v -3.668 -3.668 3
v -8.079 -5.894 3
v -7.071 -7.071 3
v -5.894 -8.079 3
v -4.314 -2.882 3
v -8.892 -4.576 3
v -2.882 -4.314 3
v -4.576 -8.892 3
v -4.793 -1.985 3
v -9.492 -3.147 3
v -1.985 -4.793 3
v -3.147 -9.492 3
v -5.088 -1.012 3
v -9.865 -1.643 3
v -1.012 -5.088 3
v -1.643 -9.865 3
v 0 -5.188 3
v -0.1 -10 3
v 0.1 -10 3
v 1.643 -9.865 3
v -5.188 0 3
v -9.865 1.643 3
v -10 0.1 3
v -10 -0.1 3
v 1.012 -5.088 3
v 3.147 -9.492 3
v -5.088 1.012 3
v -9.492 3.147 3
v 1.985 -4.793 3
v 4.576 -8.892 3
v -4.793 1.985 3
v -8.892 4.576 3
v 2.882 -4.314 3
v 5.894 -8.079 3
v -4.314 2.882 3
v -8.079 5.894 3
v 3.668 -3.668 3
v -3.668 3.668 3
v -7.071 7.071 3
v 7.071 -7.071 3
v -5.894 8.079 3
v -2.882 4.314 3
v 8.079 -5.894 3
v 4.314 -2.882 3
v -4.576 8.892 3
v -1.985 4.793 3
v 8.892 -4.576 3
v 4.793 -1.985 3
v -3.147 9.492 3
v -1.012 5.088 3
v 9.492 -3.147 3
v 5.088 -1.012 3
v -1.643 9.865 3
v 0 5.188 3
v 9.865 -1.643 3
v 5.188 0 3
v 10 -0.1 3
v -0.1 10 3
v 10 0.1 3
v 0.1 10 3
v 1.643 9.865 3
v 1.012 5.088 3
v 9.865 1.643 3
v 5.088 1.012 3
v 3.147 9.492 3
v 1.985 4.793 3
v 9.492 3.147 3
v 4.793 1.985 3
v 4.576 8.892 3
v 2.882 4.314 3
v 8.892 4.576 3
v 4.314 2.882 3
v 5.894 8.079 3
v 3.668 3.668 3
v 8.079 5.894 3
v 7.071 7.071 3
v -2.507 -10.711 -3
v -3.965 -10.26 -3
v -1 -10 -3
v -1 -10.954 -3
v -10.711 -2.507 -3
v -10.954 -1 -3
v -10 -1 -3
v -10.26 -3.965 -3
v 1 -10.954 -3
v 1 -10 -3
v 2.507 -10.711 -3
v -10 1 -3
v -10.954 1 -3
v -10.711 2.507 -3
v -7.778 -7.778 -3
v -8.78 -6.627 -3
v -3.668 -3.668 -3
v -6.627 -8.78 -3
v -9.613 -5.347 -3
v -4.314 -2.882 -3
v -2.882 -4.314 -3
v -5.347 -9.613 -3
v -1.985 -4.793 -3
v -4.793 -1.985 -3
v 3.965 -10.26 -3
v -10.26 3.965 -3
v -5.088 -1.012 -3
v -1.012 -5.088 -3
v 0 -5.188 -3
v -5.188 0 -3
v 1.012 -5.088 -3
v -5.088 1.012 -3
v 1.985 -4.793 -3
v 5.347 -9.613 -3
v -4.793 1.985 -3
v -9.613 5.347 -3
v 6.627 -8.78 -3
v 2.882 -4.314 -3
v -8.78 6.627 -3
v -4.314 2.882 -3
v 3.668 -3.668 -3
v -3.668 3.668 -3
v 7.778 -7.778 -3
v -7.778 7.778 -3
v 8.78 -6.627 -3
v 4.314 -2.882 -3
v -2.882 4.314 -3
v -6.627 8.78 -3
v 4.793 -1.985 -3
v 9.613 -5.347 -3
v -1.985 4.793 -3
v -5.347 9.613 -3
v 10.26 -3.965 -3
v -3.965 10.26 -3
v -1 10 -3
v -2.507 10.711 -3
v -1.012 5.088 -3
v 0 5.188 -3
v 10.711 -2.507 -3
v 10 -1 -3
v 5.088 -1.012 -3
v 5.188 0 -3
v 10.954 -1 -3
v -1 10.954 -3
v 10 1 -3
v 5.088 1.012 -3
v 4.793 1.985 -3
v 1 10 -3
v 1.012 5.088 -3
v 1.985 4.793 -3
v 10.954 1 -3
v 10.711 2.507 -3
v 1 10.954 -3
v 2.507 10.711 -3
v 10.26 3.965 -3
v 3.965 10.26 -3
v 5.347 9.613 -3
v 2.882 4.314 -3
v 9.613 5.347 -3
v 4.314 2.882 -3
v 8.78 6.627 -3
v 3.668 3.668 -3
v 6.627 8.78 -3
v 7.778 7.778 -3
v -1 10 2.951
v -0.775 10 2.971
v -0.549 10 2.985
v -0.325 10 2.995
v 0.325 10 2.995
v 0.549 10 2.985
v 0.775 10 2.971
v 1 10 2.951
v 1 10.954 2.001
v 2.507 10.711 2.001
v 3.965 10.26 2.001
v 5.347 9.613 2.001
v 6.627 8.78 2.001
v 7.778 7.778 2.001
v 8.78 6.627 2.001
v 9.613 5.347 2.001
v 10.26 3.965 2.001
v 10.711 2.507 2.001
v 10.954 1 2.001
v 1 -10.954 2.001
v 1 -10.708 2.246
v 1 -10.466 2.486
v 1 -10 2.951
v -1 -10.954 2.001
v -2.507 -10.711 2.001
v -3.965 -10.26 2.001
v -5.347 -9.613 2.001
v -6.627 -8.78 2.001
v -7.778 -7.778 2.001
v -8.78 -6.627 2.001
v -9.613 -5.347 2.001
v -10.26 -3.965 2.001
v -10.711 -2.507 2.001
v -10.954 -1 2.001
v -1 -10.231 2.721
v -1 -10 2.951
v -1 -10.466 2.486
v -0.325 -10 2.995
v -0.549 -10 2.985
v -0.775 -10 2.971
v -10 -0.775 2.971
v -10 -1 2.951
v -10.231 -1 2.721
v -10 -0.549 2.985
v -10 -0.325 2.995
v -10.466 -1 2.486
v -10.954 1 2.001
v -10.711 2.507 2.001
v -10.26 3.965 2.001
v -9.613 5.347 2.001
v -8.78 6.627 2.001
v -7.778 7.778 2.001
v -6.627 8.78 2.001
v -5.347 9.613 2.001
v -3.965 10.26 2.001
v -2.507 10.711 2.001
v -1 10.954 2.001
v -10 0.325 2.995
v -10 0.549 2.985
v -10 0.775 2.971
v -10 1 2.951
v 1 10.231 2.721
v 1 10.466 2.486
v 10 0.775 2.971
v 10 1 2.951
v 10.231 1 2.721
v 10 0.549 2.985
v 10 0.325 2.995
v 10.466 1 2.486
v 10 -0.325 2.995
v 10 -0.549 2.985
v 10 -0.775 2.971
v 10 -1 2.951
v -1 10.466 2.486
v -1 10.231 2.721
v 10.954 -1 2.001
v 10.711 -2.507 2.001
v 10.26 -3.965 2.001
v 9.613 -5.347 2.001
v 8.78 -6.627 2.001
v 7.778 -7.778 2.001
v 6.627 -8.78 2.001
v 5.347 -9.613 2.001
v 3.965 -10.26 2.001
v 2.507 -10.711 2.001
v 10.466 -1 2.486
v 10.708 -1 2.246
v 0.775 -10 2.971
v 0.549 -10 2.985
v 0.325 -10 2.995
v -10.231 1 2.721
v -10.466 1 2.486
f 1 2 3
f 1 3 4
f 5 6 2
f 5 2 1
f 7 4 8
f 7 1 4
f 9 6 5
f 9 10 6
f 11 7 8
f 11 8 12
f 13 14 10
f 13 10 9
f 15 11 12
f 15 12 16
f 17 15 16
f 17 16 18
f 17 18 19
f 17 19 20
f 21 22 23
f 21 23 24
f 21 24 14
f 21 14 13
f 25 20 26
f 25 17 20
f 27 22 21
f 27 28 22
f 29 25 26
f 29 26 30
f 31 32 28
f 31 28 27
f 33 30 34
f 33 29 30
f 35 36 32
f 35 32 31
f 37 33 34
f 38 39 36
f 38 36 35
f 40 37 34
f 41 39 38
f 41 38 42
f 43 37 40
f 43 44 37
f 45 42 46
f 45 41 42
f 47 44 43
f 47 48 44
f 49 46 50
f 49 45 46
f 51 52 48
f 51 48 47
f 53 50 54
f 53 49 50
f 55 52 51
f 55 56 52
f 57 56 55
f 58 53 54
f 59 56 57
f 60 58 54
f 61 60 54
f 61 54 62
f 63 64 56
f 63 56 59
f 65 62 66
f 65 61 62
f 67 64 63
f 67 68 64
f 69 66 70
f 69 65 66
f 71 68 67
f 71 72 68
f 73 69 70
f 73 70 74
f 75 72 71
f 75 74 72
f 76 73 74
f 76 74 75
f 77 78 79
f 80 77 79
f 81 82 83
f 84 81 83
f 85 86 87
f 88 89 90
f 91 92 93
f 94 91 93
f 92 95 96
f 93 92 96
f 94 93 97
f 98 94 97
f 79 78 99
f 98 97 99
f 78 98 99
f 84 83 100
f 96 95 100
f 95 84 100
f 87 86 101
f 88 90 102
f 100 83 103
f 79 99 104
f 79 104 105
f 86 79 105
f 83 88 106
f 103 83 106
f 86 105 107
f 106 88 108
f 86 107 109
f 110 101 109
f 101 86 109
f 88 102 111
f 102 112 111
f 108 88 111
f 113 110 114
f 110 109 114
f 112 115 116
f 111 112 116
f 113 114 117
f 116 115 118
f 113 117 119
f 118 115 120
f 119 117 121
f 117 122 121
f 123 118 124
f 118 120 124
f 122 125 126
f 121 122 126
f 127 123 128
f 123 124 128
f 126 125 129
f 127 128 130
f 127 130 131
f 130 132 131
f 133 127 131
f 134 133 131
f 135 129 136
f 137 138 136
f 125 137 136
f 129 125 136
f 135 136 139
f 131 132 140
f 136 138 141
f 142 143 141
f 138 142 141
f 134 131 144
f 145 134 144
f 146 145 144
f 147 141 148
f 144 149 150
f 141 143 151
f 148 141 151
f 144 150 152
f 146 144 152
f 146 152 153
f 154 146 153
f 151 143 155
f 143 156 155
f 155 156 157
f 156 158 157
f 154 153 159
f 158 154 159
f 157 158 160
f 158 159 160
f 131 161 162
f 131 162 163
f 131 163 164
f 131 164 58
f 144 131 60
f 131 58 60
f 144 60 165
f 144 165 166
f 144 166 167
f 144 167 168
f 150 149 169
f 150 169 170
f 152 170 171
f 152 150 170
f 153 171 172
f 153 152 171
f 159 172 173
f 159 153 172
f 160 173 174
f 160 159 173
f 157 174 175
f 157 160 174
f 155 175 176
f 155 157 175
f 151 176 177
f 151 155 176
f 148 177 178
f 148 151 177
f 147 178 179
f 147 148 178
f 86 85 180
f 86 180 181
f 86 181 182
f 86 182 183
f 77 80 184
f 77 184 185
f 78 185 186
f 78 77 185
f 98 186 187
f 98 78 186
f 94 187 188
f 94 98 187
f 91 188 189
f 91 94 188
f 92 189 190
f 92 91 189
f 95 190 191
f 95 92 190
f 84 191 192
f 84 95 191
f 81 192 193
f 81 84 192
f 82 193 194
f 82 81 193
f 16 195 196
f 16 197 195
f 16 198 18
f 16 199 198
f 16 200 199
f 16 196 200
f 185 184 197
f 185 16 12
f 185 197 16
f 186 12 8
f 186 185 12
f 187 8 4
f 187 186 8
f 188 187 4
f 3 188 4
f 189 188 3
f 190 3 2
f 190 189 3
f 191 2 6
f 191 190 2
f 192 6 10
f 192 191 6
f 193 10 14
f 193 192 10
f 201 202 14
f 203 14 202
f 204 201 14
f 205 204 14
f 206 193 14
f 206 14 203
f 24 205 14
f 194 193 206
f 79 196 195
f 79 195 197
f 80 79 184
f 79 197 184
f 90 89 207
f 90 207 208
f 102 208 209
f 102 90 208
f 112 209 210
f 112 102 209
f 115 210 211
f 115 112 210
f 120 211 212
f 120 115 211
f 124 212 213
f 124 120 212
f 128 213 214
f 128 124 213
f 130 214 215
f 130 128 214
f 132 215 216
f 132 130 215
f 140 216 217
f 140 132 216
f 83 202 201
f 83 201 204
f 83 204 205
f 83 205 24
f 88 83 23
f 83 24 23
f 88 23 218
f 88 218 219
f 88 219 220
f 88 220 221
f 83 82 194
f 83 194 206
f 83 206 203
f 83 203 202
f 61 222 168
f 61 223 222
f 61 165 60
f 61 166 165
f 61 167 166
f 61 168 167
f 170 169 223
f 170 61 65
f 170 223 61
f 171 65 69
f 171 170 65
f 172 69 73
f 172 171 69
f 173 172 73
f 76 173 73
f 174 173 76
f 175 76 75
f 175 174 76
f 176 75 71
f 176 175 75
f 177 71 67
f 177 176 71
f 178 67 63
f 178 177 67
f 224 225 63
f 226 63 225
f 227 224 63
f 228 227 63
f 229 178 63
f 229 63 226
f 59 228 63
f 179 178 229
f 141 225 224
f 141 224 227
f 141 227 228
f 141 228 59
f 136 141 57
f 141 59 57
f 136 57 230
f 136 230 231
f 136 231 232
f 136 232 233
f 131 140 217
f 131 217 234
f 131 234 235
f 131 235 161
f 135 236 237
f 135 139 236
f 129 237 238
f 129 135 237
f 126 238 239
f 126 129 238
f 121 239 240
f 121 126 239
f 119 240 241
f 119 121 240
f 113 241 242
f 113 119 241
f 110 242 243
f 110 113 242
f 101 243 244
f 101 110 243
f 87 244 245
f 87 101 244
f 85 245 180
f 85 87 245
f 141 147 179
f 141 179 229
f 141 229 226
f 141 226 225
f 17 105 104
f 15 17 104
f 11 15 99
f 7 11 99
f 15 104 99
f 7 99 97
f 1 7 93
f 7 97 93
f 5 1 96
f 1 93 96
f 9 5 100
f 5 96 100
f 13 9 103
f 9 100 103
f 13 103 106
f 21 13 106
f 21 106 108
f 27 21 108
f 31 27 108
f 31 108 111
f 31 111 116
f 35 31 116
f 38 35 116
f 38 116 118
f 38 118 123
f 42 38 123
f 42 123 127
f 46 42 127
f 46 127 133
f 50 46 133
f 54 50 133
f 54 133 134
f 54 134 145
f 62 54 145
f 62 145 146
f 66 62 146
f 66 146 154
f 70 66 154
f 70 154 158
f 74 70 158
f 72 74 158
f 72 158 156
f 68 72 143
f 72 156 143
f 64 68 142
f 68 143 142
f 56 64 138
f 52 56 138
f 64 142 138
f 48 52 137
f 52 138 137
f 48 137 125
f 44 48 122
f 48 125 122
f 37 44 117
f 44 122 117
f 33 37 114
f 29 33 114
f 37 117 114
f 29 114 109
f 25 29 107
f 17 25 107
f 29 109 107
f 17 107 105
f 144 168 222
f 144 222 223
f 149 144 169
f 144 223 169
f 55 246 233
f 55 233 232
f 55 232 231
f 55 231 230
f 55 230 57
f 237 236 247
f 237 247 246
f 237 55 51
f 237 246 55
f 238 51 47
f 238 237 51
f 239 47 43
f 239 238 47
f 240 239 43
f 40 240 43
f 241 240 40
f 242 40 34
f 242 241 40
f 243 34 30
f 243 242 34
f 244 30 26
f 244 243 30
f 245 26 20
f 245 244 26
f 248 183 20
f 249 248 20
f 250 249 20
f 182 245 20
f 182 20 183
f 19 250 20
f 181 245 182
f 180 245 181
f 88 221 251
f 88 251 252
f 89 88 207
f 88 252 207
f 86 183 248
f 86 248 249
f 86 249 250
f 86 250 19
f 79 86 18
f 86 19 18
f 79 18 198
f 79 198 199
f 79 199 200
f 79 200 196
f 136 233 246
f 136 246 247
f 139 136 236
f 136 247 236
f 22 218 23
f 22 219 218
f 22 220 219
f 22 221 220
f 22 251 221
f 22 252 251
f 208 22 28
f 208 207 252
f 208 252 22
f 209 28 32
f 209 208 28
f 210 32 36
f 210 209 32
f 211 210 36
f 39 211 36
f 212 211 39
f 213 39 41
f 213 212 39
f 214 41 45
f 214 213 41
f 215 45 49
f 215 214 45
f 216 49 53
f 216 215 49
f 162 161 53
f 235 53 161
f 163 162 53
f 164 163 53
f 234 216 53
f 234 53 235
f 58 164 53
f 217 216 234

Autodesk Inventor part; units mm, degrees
ref_plane "YZ Plane" through (0, 0, 0) normal (1, 0, 0) x (0, 1, 0)
ref_plane "XZ Plane" through (0, 0, 0) normal (0, 1, 0) x (-1, 0, 0)
ref_plane "XY Plane" through (0, 0, 0) normal (0, 0, 1) x (1, 0, 0)
sketch "Sketch1" plane through (0, 0, 0) normal (0, 0, 1) x (1, 0, 0)
  circle A0 centre (0, 0) radius 11
  dimension "d0" = 22
extrude "Extrusion1" add sketch "Sketch1" along normal mid plane 6
sketch "Sketch3" plane through (0, 0, 3) normal (0, 0, 1) x (1, 0, 0)
  point P0 (0, 0)
hole "Hole1" at (0, 0, 3) direction (0, 0, -1) diameter 10.376 end through all thread size "M12x1.5" class "6H" standard "ISO Metric profile"
sketch "Sketch2" plane through (0, 0, 3) normal (0, 0, 1) x (1, 0, 0)
  line L0 (11, 1) -> (10, 1)
  line L1 (10, 1) -> (10, -1)
  line L2 (10, -1) -> (11, -1)
  line L3 (11, -1) -> (11, 1)
  circle A0 centre (0, 0) radius 11 construction
  point P0 (10, 0)
  dimension "d3" = 2
  dimension "d4" = 1
extrude "Extrusion2" cut sketch "Sketch2" against normal through all
pattern_circular "Circular Pattern1" count 4 over 360 about axis through (0, 0, 0) along (0, 0, 1) of "Extrusion2"
chamfer "Chamfer1" distance 1 angle 45 4 edges at (7.7782, -7.7782, 3) (7.7782, 7.7782, 3) (-7.7782, 7.7782, 3) (-7.7782, -7.7782, 3)
properties material "Stainless Steel"
